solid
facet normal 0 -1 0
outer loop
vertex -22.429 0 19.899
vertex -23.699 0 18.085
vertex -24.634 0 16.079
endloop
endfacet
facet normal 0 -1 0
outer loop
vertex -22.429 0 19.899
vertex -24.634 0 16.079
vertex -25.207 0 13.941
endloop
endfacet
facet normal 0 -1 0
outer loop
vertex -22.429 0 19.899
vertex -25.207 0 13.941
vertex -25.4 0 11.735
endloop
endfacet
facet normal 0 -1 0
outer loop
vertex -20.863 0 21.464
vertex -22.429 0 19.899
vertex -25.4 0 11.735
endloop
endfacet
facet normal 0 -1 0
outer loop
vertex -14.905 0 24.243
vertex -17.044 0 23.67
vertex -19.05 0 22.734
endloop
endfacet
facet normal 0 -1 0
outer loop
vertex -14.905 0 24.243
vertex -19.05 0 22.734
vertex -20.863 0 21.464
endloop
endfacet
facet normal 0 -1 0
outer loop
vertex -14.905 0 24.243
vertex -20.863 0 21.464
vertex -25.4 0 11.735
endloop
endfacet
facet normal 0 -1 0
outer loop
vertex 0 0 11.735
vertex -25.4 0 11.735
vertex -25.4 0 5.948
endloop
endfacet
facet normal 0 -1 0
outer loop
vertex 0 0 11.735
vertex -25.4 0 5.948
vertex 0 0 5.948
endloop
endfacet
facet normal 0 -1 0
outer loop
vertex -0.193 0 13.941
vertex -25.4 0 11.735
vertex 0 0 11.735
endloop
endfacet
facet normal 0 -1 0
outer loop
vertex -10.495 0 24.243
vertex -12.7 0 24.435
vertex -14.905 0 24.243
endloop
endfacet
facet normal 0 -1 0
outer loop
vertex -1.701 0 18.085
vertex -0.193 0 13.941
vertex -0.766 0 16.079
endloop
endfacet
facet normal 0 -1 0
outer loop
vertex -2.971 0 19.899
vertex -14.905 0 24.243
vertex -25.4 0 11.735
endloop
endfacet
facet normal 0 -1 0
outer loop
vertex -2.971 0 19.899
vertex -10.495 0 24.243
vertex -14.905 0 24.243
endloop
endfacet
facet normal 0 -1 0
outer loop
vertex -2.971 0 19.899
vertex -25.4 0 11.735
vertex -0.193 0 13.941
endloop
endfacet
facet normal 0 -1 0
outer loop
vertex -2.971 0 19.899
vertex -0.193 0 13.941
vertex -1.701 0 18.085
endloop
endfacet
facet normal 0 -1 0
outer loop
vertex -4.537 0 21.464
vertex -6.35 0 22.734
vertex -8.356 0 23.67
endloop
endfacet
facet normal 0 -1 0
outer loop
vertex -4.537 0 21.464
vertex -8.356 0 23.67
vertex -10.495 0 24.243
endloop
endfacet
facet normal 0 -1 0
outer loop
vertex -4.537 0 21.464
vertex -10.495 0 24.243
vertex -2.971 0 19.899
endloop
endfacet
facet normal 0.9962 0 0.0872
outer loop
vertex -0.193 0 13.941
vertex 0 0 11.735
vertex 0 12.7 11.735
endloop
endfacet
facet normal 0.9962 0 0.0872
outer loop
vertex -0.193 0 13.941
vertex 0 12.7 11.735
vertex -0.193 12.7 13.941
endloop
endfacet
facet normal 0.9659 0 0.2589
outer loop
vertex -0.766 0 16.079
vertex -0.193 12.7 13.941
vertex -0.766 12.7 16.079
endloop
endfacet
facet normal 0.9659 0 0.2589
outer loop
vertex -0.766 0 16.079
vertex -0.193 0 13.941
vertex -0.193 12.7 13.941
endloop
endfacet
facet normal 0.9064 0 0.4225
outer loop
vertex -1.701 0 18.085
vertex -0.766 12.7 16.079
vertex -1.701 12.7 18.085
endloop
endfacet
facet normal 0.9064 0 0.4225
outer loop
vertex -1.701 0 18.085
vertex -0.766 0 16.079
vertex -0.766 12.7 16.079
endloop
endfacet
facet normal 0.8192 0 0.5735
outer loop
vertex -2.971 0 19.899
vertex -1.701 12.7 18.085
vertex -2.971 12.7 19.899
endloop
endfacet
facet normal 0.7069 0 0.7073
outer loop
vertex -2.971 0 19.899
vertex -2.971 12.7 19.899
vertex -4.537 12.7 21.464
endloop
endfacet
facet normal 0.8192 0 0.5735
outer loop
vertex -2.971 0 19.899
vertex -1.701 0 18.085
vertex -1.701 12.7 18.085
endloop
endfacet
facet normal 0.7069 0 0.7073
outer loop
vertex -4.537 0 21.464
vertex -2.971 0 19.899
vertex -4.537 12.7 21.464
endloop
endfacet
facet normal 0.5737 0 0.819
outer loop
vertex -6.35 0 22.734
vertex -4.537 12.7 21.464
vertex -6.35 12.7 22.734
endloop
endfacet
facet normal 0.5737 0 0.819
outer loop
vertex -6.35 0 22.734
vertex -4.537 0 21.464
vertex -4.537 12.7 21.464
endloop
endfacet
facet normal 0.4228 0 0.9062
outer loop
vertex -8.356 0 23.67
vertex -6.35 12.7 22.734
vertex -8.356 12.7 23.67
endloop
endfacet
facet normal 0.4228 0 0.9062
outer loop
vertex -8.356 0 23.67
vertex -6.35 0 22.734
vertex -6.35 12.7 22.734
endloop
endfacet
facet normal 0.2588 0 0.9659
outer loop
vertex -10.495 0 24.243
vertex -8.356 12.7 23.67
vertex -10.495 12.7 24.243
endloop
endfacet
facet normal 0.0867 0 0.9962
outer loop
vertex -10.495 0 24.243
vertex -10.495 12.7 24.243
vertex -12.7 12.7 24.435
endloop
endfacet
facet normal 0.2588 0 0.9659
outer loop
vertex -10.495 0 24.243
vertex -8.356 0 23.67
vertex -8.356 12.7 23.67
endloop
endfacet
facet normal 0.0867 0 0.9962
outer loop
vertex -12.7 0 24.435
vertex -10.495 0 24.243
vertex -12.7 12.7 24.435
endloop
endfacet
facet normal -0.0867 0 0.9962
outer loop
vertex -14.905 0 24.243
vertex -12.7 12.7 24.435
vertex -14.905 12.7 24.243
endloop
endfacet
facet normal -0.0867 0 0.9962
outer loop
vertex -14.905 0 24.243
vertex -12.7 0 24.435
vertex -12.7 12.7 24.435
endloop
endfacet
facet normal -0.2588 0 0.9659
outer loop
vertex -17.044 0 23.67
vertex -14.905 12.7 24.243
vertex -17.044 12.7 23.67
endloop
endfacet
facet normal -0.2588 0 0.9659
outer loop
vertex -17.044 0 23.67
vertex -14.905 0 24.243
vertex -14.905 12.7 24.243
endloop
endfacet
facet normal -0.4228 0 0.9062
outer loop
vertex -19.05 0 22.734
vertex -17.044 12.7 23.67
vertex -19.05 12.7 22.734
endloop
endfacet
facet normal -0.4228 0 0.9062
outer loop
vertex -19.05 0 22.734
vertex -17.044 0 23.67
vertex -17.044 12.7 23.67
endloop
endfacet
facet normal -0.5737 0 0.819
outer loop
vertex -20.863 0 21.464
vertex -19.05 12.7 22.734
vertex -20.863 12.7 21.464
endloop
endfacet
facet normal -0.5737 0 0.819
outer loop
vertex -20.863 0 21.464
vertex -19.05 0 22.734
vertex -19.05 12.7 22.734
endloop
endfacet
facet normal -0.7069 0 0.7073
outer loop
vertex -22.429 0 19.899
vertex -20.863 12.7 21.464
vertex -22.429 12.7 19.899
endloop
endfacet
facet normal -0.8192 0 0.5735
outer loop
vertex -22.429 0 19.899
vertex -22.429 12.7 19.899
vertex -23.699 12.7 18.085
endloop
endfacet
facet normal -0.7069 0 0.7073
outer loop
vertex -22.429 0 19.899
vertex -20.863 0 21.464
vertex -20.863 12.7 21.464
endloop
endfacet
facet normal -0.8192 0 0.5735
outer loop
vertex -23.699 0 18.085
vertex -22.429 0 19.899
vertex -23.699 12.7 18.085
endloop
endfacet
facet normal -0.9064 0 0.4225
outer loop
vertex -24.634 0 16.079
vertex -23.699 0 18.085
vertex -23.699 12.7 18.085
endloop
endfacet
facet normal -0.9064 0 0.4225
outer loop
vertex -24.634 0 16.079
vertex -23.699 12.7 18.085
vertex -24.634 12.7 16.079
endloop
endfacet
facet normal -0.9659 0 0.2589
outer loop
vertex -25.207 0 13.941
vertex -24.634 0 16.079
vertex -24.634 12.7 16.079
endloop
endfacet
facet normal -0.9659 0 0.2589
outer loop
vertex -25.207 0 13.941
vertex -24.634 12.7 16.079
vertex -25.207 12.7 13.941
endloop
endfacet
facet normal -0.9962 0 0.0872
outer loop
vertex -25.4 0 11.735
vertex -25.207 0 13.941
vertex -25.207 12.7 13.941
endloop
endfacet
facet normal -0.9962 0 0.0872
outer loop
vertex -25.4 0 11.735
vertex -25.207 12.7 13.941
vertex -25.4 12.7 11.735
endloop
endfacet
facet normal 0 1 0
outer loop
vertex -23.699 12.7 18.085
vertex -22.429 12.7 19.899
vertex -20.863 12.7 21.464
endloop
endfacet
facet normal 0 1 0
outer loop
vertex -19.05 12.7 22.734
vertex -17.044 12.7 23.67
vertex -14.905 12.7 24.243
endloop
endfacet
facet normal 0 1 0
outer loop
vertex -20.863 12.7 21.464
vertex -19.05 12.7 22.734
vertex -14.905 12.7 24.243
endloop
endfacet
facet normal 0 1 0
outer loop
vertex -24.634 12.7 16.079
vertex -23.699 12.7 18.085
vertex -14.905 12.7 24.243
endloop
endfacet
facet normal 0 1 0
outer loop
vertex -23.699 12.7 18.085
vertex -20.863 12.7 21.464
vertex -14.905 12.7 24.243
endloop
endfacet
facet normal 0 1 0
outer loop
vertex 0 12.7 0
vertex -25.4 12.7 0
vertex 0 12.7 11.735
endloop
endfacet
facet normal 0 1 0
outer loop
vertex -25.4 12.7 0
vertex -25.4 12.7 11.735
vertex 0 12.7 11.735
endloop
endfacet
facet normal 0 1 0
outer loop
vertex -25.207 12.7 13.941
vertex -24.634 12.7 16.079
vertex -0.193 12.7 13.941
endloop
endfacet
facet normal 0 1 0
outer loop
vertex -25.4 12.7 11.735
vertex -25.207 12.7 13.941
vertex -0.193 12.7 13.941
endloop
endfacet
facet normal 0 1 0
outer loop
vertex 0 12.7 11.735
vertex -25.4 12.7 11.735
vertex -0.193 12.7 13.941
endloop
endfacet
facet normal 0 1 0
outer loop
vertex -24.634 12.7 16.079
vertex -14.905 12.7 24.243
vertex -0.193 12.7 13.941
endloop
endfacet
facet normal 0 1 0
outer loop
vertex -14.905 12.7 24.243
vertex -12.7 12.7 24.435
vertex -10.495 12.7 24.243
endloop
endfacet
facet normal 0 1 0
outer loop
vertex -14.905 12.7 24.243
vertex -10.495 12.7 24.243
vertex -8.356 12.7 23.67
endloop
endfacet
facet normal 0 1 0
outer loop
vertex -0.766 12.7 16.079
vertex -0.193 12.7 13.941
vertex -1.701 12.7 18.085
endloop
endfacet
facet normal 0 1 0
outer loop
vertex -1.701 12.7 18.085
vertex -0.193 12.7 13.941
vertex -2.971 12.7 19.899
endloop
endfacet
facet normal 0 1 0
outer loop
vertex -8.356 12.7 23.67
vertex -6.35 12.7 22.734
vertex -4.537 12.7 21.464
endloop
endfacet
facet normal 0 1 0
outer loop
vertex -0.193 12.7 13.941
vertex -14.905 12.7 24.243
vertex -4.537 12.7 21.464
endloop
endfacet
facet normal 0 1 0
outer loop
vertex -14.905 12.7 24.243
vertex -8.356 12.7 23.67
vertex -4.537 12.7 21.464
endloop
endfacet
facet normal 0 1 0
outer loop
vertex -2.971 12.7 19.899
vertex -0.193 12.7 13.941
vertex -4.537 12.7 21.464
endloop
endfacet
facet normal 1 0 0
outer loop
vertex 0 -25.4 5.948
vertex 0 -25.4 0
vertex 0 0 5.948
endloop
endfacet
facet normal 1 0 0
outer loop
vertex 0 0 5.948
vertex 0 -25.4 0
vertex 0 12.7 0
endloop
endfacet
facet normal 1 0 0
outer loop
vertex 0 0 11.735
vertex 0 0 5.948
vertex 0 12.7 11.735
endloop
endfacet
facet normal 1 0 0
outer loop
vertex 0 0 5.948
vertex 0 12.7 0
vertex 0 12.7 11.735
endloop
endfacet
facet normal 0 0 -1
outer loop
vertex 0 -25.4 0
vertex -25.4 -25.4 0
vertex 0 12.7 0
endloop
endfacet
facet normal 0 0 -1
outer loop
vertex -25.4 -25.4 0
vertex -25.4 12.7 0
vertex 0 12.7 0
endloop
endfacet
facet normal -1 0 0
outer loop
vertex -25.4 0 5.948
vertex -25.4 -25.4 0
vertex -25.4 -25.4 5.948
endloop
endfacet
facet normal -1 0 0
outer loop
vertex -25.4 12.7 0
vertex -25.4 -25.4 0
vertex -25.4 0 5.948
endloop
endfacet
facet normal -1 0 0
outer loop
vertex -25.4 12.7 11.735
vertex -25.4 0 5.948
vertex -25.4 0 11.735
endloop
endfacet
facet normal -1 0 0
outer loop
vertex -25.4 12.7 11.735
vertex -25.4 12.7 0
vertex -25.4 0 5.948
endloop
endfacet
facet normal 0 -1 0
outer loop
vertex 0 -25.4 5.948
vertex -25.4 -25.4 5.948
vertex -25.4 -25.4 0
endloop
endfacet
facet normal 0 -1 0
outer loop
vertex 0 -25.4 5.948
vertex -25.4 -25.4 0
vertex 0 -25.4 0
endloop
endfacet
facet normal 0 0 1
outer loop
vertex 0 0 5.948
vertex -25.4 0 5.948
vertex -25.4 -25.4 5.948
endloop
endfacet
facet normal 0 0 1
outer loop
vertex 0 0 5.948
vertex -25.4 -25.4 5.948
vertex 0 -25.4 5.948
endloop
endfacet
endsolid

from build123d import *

# Parameters (mm, degrees)
F0_W     = 25.4
F0_H     = 5.9481007091
F1_DEPTH = 12.7
F2_DEPTH = 25.4


with BuildPart() as f1:
    # F0 (on Front) → F1 (new body)
    with BuildSketch(Plane.XZ):
        with Locations((-12.7, 2.9740503545)):
            Rectangle(F0_W, F0_H)
        with BuildLine():
            Line((-25.4, 11.7354422192), (-25.4, 5.9481007091))
            Line((-25.4, 5.9481007091), (0, 5.9481007091))
            Line((0, 5.9481007091), (0, 11.7354422192))
            ThreePointArc((0, 11.7354422192), (-12.7, 24.4354422192), (-25.4, 11.7354422192))
        make_face()
    extrude(amount=-F1_DEPTH)

    # F0 (on Front) → F2 (join)
    with BuildSketch(Plane.XZ):
        with Locations((-12.7, 2.9740503545)):
            Rectangle(F0_W, F0_H)
    extrude(amount=F2_DEPTH)


solid = f1.part
